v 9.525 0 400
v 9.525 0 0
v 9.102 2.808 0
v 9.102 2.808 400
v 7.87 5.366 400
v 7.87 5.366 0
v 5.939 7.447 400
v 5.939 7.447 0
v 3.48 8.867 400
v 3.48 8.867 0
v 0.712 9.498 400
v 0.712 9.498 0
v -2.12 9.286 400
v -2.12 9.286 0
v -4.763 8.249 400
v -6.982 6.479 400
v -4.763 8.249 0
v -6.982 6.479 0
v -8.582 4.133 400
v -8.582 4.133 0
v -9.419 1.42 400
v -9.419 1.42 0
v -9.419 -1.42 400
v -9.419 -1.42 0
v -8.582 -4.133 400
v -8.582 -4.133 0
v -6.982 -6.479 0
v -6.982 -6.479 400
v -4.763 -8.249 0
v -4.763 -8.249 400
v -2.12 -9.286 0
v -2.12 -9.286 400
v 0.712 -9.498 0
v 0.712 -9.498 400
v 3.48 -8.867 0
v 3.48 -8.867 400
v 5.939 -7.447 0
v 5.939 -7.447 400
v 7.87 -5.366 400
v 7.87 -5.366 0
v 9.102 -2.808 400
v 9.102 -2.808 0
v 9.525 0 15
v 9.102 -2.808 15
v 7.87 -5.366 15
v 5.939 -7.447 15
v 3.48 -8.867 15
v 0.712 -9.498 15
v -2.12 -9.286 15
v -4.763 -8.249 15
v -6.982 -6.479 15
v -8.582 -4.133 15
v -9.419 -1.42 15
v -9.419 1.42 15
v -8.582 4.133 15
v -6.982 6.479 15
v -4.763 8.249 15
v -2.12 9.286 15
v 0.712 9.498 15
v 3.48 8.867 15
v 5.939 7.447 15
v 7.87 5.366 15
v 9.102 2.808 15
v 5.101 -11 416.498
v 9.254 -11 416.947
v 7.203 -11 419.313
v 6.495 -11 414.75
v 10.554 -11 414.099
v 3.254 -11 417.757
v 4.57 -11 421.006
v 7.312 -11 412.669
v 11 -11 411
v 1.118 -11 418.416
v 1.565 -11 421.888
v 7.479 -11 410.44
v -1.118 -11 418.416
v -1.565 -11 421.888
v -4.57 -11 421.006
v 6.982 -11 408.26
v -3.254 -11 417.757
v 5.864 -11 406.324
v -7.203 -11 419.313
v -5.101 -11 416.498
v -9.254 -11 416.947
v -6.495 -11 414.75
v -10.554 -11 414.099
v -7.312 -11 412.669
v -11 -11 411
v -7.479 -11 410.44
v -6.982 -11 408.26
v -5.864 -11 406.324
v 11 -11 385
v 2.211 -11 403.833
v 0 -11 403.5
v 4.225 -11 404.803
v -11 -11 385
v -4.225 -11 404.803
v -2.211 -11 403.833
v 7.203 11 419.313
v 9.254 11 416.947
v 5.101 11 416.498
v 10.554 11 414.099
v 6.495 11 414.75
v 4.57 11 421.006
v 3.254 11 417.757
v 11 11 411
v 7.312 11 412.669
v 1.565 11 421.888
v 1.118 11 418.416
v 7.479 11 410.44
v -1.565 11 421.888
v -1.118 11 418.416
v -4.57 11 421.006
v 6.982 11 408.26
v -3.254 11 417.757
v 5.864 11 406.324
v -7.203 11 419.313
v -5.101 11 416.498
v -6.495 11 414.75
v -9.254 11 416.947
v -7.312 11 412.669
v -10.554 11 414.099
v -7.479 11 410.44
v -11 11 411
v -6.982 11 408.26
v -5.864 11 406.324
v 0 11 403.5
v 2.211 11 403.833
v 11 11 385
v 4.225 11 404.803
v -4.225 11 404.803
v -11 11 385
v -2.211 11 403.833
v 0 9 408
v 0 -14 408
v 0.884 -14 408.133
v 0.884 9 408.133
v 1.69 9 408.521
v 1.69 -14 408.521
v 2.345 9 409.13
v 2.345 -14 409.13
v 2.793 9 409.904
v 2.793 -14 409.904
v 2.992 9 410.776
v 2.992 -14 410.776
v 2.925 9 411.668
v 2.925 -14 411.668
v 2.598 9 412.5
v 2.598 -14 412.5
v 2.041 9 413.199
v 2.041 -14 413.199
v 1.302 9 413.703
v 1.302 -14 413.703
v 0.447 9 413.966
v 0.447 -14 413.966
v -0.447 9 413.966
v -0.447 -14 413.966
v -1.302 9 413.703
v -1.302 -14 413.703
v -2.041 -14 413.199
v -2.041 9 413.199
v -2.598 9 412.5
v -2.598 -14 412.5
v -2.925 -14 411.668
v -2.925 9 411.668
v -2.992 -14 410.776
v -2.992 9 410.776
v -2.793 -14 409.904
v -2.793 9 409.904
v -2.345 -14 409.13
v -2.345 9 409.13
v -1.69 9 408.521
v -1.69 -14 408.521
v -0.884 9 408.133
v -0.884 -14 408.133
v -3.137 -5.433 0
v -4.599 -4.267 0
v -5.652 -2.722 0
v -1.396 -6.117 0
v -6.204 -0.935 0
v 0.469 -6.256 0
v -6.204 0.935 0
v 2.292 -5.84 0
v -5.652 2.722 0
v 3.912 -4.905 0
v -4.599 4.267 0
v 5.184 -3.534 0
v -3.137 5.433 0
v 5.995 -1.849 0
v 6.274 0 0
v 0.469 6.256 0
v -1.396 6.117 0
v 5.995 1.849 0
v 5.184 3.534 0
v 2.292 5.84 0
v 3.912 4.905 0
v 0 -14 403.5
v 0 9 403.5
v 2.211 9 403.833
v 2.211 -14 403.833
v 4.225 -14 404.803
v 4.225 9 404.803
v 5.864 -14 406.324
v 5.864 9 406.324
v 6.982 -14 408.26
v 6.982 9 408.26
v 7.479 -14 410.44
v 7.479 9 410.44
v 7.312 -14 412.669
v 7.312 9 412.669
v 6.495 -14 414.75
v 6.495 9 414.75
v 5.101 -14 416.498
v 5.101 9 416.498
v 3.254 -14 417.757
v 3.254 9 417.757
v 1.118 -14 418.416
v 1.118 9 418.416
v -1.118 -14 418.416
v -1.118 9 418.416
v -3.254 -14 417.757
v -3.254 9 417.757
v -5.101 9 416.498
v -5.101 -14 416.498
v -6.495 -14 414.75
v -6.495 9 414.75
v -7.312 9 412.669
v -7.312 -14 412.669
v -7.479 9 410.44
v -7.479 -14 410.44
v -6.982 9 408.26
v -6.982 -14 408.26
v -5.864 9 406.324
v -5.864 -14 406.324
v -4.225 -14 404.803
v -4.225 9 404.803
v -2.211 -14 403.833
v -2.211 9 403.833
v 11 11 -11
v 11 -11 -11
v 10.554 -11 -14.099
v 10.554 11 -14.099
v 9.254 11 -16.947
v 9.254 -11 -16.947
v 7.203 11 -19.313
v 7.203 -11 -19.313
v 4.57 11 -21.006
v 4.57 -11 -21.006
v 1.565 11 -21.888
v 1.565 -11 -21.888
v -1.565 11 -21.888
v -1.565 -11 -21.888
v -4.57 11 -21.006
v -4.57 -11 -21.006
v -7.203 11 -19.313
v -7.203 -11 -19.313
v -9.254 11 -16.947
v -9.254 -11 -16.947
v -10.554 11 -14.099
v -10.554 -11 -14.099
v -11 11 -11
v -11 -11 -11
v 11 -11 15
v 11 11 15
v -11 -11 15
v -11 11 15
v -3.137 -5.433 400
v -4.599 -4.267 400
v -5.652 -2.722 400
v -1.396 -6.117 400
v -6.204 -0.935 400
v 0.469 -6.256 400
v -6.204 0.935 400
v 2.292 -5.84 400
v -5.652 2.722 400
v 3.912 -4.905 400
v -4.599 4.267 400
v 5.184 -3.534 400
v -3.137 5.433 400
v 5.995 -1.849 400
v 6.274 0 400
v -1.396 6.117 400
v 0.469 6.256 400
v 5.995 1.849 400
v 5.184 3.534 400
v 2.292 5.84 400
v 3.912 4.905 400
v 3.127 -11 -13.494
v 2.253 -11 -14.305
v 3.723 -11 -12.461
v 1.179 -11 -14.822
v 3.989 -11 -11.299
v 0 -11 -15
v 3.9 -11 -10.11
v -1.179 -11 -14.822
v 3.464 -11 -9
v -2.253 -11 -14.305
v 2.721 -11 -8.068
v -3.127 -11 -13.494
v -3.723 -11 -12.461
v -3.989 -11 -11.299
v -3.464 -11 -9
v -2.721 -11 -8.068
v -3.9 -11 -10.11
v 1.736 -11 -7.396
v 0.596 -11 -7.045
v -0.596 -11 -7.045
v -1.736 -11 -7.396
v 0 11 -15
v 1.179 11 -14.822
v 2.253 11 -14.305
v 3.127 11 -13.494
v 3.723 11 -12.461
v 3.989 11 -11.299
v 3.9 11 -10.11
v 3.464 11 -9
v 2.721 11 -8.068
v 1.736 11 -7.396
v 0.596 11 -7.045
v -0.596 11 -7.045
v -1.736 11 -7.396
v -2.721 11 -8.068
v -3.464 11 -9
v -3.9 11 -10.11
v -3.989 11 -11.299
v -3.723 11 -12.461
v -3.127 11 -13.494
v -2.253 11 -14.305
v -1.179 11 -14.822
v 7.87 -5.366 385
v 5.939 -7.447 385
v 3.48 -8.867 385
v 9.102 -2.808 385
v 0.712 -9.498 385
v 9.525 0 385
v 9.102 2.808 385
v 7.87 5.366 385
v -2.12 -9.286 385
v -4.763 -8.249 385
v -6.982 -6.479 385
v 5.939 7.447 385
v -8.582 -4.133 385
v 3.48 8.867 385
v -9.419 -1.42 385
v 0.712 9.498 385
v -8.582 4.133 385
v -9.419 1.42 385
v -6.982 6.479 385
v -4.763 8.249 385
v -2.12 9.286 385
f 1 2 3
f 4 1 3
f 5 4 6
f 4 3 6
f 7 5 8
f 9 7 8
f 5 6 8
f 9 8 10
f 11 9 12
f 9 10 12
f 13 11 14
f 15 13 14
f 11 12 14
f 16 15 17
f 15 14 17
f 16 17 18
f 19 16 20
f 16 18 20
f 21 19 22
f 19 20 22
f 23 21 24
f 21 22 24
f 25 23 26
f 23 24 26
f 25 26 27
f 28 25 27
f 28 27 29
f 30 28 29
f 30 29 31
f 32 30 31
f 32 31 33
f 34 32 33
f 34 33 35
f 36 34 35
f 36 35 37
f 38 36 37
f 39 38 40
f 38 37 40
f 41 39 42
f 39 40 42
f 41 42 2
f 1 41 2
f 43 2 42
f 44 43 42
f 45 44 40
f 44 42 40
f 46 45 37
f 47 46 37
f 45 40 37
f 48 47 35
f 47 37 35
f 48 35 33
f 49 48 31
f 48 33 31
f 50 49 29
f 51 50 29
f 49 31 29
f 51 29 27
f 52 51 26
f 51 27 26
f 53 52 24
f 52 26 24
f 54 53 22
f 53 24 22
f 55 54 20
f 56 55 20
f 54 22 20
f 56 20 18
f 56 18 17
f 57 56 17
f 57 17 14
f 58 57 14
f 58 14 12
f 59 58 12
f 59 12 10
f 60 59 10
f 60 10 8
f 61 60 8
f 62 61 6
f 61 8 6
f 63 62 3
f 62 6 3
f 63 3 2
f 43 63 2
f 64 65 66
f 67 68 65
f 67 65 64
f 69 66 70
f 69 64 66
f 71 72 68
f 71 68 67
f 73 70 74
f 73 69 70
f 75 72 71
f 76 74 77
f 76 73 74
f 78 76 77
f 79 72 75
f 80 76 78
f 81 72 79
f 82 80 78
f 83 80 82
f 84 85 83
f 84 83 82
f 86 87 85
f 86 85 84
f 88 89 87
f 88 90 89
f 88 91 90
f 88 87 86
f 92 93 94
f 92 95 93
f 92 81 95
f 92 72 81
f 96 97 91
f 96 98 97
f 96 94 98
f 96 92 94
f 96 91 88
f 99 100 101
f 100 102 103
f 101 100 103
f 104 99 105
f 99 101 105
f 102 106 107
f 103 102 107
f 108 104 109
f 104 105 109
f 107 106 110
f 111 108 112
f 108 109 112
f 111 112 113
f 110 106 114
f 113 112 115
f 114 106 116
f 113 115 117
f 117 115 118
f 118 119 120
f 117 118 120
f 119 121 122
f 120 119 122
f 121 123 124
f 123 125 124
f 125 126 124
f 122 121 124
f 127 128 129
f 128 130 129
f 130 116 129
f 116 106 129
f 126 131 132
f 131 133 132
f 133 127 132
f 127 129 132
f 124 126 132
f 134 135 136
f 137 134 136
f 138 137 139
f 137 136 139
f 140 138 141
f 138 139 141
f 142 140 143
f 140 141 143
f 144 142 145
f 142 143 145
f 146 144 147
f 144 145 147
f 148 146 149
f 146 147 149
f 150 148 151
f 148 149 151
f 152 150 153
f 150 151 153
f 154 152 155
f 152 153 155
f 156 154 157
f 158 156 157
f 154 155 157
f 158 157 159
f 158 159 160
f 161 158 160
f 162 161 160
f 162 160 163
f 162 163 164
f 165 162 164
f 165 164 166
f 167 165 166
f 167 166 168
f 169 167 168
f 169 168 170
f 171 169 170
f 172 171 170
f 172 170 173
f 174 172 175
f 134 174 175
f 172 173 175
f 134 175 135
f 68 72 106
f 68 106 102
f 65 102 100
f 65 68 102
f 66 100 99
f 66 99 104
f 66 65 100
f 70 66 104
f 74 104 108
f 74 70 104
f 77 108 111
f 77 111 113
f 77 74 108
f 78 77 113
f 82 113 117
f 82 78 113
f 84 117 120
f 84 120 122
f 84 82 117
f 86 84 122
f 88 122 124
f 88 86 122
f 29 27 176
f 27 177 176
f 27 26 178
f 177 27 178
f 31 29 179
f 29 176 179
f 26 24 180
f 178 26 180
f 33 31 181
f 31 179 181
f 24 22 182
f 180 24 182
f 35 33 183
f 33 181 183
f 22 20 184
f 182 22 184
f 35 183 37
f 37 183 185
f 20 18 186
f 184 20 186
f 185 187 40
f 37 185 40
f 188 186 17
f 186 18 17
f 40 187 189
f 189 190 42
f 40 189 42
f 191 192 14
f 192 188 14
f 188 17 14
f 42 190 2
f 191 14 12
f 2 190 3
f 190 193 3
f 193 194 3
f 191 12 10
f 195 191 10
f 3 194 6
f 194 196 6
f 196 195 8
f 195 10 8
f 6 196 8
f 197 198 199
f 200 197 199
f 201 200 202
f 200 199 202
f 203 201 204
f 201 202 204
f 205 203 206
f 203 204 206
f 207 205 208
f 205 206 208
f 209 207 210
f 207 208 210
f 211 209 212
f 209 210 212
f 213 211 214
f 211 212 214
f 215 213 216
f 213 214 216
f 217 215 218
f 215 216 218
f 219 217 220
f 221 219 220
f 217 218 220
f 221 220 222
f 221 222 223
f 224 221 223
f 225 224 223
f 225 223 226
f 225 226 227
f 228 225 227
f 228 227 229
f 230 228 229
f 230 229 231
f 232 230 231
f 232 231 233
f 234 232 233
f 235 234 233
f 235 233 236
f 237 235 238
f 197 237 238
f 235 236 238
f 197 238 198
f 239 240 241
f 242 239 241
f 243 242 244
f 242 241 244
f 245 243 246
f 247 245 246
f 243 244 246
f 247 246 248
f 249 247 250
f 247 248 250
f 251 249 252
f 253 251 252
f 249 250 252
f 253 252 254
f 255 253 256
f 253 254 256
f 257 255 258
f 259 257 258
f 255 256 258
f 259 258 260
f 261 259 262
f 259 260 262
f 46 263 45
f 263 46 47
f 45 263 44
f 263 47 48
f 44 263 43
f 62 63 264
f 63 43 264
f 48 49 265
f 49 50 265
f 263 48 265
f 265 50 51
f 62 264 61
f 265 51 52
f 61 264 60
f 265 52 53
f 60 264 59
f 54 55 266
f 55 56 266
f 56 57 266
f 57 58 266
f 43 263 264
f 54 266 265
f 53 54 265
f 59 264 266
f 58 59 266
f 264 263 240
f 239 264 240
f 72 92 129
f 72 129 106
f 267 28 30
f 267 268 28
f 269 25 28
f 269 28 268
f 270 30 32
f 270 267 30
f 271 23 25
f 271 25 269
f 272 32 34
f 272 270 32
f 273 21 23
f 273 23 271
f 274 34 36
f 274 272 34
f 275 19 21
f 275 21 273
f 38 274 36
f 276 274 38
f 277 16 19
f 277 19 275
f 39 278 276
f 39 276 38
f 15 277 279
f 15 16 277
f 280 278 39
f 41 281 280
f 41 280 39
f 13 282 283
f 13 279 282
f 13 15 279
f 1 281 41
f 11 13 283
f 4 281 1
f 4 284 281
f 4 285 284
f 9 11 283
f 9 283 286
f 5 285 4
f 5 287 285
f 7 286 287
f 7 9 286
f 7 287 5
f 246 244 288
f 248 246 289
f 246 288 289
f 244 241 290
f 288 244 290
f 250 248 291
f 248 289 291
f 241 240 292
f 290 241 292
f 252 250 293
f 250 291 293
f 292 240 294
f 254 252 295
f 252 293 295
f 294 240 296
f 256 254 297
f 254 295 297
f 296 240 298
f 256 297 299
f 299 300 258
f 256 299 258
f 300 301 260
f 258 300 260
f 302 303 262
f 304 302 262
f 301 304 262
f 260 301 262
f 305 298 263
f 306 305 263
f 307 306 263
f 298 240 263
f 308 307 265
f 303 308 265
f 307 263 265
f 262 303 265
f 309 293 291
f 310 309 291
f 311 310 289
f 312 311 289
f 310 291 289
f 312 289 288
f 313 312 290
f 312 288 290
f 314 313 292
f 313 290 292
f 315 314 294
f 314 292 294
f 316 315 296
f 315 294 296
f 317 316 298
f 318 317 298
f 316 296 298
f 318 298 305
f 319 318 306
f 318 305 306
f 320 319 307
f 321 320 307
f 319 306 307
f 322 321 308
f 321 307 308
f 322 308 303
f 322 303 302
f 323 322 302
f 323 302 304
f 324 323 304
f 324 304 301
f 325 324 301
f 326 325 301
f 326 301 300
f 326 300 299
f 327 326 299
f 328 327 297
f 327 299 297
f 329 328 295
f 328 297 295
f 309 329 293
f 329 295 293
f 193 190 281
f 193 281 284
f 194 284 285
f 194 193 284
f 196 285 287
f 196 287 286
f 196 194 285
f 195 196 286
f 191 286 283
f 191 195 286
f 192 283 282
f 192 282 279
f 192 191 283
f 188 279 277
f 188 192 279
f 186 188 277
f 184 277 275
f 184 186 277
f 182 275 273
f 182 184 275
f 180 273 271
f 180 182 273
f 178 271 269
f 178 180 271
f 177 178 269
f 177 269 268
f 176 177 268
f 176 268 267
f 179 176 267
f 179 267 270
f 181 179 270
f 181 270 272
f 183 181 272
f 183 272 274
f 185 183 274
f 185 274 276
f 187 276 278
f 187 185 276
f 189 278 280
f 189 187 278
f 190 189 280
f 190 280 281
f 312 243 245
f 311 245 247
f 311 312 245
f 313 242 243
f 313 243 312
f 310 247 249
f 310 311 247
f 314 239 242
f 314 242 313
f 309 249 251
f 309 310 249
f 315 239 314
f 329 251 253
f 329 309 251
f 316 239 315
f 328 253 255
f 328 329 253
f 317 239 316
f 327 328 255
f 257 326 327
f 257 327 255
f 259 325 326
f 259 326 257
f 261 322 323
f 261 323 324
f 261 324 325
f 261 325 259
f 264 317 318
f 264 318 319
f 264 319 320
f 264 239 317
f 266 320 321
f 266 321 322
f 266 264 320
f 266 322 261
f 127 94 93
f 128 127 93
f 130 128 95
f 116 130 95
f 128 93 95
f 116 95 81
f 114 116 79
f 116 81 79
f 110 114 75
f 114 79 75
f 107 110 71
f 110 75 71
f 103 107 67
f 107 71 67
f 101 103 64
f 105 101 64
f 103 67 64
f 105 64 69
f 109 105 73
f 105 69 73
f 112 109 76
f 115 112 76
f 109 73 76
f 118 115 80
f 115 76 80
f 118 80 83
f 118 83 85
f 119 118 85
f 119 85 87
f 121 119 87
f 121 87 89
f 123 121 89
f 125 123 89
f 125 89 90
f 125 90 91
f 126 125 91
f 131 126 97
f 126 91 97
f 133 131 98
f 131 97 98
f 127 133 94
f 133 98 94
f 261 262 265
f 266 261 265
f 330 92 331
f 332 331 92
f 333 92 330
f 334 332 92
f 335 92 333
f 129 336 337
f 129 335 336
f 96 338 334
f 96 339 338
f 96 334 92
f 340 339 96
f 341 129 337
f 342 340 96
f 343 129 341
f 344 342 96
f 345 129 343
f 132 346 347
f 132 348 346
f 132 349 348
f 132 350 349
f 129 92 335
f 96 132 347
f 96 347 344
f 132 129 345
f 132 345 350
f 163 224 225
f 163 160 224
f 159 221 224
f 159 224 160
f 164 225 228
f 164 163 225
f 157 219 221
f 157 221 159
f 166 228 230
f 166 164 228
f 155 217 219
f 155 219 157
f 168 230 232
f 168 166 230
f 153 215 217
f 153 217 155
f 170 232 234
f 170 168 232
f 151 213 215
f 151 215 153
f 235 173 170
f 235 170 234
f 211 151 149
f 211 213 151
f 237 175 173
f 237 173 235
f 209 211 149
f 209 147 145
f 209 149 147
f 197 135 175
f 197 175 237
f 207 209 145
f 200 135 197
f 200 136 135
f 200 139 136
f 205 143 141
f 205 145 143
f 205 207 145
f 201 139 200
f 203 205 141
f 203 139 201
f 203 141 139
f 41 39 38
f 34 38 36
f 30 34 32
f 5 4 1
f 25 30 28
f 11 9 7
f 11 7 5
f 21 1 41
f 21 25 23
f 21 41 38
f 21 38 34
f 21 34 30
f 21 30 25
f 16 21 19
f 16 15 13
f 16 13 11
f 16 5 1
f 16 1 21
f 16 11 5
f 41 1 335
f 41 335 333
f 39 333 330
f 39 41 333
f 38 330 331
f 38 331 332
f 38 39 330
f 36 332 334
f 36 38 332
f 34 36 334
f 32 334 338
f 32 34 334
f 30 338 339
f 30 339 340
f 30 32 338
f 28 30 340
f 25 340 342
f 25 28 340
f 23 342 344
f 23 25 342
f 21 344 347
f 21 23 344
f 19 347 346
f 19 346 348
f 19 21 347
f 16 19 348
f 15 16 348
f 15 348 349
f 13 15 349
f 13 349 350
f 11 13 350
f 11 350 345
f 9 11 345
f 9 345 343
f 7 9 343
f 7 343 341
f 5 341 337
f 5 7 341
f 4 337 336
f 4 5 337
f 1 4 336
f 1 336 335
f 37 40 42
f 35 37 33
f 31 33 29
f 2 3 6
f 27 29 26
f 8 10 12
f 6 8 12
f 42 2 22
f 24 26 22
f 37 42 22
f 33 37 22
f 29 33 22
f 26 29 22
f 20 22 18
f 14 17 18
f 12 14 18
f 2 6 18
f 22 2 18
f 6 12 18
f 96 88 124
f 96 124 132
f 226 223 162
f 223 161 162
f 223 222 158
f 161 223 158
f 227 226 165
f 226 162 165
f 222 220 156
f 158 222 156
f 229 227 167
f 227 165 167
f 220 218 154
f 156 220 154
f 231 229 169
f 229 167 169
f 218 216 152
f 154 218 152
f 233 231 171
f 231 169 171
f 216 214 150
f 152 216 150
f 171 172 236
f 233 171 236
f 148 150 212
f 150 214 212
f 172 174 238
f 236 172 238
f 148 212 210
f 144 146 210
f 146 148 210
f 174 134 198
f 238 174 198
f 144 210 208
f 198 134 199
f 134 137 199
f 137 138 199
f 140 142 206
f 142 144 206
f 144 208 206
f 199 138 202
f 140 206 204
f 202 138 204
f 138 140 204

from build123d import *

# Parameters (mm, degrees)
SKETCH1_R                = 9.525
SKETCH1_R_2              = 6.2738
BOSS_EXTRUDE1_DEPTH      = 400
SKETCH2_W                = 22
SKETCH2_H                = 22
SKETCH2_R                = 9.525
BOSS_EXTRUDE2_DEPTH      = 15
SKETCH2_2_W              = 22
SKETCH2_2_H              = 22
BOSS_EXTRUDE3_DEPTH      = 2
SKETCH3_R                = 4
BOSS_EXTRUDE4_DEPTH      = 22
SKETCH4_R                = 7.5
CUT_EXTRUDE1_DEPTH       = 22
BOSS_EXTRUDE5_DEPTH      = 3
BOSS_EXTRUDE5_DEPTH_BACK = 20
SKETCH6_R                = 7.5
SKETCH8_R                = 3
CUT_EXTRUDE2_DEPTH       = 23


with BuildPart() as part:
    # Sketch1 → Boss-Extrude1 (new body)
    with BuildSketch(Plane.XY):
        Circle(SKETCH1_R)
        Circle(SKETCH1_R_2, mode=Mode.SUBTRACT)
    extrude(amount=BOSS_EXTRUDE1_DEPTH)


with BuildPart() as body_2:
    # Sketch2 → Boss-Extrude2 (new body)
    with BuildSketch(Plane(origin=(0, 0, 0), x_dir=(-1, 0, 0), z_dir=(0, 0, -1))):
        Rectangle(SKETCH2_W, SKETCH2_H)
        with Locations(Location((0, 0, 0), (0, 0, 180))):
            Circle(SKETCH2_R, mode=Mode.SUBTRACT)
    extrude(amount=-BOSS_EXTRUDE2_DEPTH)


with BuildPart() as body_3:
    # Sketch2<2> → Boss-Extrude3 (new body)
    with BuildSketch(Plane(origin=(0, 0, 0), x_dir=(-1, 0, 0), z_dir=(0, 0, -1))):
        Rectangle(SKETCH2_2_W, SKETCH2_2_H)
    extrude(amount=BOSS_EXTRUDE3_DEPTH)


with BuildPart() as body_2_1:
    add(body_2.part)

    # Combine1: union body 3
    add(body_3.part)

    # Sketch3 → Boss-Extrude4 (add)
    with BuildSketch(Plane.XZ.offset(11)):
        with BuildLine():
            Line((11, -2), (11, -11))
            ThreePointArc((11, -11), (0, -22), (-11, -11))
            Line((-11, -11), (-11, -2))
            Line((-11, -2), (11, -2))
        make_face()
        with Locations(Location((0, -11, 0), (0, 0, 270))):
            Circle(SKETCH3_R, mode=Mode.SUBTRACT)
    extrude(amount=-BOSS_EXTRUDE4_DEPTH)


with BuildPart() as body_3_2:
    # Mirror7: mirrored copy
    add(body_2_1.part.mirror(Plane(origin=(0, 0, 200), x_dir=(1, 0, 0), z_dir=(0, 0, -1))))

    # Sketch4 → Cut-Extrude1 (cut)
    with BuildSketch(Plane.XZ.offset(11)):
        with Locations(Location((0, 411, 0), (0, 0, 270))):
            Circle(SKETCH4_R)
    extrude(amount=-CUT_EXTRUDE1_DEPTH, mode=Mode.SUBTRACT)


with BuildPart() as body_4:
    # Sketch6 → Boss-Extrude5 (new, two sides: drawn at the far end of the back side and taken through both)
    with BuildSketch(Plane.XZ.offset(11).offset(-BOSS_EXTRUDE5_DEPTH_BACK)):
        with Locations(Location((0, 411, 0), (0, 0, 270))):
            Circle(SKETCH6_R)
    extrude(amount=BOSS_EXTRUDE5_DEPTH + BOSS_EXTRUDE5_DEPTH_BACK)

    # Sketch8 → Cut-Extrude2 (cut)
    with BuildSketch(Plane.XZ.offset(14)):
        with Locations(Location((0, 411, 0), (0, 0, 270))):
            Circle(SKETCH8_R)
    extrude(amount=-CUT_EXTRUDE2_DEPTH, mode=Mode.SUBTRACT)


solid = Compound([part.part, body_2_1.part, body_3_2.part, body_4.part])
